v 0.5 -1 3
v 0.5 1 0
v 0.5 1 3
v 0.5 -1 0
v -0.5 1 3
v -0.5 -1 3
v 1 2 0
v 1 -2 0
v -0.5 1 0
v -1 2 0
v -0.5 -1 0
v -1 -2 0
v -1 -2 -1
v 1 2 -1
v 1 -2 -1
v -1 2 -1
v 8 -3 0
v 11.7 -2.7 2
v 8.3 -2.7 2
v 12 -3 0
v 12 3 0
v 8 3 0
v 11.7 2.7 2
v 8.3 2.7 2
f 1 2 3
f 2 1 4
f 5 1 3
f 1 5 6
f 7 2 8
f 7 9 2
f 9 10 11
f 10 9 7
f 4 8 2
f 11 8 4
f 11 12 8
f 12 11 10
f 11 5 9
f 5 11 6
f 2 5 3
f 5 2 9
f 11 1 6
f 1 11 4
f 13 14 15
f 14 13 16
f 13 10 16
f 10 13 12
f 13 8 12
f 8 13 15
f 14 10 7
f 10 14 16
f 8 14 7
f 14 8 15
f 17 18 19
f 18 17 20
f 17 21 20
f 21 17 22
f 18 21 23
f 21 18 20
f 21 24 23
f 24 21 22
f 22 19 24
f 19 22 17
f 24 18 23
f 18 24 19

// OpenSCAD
// ### Usage #########################################################
prism([1, 2, 3]);
prism([2, 4, 1], invert = true);

translate([10, 0, 0])
prism_tapered_cuboid([4, 6, 2], 0.3);


// ### Module ########################################################

// A cube with center centered on the base
// dims - cube dimensions: [x, y, z]
// invert - center is on top
module prism(dims, invert = false) {
	if (invert) {
		rotate([180, 0, 0])
		prism_base(dims);
	} else {
		prism_base(dims);
	}
}

module prism_base(dims) {
	translate([0, 0, dims[2] / 2])
	cube(dims, center = true);
}


// A cuboid with a tapered top
// dims - cube dimensions: [x, y, z]
// taper - by how much to taper the each edge at the top
module prism_tapered_cuboid(dims, taper) {
  ho = taper;
  hx = dims.x - taper;
  hy = dims.y - taper;
  translate([-dims.x/2, -dims.y/2, 0])
  polyhedron( 
    points=[
      [     0,      0,      0], //    6-----7
      [ taper,  taper, dims.z], //   /|    /|
      [    hx,  taper, dims.z], //  1-+---3 |
      [dims.x,      0,      0], //  | 5-- +-8
      [     0, dims.y,      0], //  |/    |/
      [ taper,     hy, dims.z], //  0-----4
      [    hx,     hy, dims.z],
      [dims.x, dims.y,      0] 
    ],
    faces = [
      [0, 1, 2, 3], // side face
      [3, 2, 6, 7], // side face
      [7, 6, 5, 4], // side face
      [4, 5, 1, 0], // side face
      [1, 5, 6, 2], // top face
      [4, 0, 3, 7], // bottom face
    ]
  );
}
